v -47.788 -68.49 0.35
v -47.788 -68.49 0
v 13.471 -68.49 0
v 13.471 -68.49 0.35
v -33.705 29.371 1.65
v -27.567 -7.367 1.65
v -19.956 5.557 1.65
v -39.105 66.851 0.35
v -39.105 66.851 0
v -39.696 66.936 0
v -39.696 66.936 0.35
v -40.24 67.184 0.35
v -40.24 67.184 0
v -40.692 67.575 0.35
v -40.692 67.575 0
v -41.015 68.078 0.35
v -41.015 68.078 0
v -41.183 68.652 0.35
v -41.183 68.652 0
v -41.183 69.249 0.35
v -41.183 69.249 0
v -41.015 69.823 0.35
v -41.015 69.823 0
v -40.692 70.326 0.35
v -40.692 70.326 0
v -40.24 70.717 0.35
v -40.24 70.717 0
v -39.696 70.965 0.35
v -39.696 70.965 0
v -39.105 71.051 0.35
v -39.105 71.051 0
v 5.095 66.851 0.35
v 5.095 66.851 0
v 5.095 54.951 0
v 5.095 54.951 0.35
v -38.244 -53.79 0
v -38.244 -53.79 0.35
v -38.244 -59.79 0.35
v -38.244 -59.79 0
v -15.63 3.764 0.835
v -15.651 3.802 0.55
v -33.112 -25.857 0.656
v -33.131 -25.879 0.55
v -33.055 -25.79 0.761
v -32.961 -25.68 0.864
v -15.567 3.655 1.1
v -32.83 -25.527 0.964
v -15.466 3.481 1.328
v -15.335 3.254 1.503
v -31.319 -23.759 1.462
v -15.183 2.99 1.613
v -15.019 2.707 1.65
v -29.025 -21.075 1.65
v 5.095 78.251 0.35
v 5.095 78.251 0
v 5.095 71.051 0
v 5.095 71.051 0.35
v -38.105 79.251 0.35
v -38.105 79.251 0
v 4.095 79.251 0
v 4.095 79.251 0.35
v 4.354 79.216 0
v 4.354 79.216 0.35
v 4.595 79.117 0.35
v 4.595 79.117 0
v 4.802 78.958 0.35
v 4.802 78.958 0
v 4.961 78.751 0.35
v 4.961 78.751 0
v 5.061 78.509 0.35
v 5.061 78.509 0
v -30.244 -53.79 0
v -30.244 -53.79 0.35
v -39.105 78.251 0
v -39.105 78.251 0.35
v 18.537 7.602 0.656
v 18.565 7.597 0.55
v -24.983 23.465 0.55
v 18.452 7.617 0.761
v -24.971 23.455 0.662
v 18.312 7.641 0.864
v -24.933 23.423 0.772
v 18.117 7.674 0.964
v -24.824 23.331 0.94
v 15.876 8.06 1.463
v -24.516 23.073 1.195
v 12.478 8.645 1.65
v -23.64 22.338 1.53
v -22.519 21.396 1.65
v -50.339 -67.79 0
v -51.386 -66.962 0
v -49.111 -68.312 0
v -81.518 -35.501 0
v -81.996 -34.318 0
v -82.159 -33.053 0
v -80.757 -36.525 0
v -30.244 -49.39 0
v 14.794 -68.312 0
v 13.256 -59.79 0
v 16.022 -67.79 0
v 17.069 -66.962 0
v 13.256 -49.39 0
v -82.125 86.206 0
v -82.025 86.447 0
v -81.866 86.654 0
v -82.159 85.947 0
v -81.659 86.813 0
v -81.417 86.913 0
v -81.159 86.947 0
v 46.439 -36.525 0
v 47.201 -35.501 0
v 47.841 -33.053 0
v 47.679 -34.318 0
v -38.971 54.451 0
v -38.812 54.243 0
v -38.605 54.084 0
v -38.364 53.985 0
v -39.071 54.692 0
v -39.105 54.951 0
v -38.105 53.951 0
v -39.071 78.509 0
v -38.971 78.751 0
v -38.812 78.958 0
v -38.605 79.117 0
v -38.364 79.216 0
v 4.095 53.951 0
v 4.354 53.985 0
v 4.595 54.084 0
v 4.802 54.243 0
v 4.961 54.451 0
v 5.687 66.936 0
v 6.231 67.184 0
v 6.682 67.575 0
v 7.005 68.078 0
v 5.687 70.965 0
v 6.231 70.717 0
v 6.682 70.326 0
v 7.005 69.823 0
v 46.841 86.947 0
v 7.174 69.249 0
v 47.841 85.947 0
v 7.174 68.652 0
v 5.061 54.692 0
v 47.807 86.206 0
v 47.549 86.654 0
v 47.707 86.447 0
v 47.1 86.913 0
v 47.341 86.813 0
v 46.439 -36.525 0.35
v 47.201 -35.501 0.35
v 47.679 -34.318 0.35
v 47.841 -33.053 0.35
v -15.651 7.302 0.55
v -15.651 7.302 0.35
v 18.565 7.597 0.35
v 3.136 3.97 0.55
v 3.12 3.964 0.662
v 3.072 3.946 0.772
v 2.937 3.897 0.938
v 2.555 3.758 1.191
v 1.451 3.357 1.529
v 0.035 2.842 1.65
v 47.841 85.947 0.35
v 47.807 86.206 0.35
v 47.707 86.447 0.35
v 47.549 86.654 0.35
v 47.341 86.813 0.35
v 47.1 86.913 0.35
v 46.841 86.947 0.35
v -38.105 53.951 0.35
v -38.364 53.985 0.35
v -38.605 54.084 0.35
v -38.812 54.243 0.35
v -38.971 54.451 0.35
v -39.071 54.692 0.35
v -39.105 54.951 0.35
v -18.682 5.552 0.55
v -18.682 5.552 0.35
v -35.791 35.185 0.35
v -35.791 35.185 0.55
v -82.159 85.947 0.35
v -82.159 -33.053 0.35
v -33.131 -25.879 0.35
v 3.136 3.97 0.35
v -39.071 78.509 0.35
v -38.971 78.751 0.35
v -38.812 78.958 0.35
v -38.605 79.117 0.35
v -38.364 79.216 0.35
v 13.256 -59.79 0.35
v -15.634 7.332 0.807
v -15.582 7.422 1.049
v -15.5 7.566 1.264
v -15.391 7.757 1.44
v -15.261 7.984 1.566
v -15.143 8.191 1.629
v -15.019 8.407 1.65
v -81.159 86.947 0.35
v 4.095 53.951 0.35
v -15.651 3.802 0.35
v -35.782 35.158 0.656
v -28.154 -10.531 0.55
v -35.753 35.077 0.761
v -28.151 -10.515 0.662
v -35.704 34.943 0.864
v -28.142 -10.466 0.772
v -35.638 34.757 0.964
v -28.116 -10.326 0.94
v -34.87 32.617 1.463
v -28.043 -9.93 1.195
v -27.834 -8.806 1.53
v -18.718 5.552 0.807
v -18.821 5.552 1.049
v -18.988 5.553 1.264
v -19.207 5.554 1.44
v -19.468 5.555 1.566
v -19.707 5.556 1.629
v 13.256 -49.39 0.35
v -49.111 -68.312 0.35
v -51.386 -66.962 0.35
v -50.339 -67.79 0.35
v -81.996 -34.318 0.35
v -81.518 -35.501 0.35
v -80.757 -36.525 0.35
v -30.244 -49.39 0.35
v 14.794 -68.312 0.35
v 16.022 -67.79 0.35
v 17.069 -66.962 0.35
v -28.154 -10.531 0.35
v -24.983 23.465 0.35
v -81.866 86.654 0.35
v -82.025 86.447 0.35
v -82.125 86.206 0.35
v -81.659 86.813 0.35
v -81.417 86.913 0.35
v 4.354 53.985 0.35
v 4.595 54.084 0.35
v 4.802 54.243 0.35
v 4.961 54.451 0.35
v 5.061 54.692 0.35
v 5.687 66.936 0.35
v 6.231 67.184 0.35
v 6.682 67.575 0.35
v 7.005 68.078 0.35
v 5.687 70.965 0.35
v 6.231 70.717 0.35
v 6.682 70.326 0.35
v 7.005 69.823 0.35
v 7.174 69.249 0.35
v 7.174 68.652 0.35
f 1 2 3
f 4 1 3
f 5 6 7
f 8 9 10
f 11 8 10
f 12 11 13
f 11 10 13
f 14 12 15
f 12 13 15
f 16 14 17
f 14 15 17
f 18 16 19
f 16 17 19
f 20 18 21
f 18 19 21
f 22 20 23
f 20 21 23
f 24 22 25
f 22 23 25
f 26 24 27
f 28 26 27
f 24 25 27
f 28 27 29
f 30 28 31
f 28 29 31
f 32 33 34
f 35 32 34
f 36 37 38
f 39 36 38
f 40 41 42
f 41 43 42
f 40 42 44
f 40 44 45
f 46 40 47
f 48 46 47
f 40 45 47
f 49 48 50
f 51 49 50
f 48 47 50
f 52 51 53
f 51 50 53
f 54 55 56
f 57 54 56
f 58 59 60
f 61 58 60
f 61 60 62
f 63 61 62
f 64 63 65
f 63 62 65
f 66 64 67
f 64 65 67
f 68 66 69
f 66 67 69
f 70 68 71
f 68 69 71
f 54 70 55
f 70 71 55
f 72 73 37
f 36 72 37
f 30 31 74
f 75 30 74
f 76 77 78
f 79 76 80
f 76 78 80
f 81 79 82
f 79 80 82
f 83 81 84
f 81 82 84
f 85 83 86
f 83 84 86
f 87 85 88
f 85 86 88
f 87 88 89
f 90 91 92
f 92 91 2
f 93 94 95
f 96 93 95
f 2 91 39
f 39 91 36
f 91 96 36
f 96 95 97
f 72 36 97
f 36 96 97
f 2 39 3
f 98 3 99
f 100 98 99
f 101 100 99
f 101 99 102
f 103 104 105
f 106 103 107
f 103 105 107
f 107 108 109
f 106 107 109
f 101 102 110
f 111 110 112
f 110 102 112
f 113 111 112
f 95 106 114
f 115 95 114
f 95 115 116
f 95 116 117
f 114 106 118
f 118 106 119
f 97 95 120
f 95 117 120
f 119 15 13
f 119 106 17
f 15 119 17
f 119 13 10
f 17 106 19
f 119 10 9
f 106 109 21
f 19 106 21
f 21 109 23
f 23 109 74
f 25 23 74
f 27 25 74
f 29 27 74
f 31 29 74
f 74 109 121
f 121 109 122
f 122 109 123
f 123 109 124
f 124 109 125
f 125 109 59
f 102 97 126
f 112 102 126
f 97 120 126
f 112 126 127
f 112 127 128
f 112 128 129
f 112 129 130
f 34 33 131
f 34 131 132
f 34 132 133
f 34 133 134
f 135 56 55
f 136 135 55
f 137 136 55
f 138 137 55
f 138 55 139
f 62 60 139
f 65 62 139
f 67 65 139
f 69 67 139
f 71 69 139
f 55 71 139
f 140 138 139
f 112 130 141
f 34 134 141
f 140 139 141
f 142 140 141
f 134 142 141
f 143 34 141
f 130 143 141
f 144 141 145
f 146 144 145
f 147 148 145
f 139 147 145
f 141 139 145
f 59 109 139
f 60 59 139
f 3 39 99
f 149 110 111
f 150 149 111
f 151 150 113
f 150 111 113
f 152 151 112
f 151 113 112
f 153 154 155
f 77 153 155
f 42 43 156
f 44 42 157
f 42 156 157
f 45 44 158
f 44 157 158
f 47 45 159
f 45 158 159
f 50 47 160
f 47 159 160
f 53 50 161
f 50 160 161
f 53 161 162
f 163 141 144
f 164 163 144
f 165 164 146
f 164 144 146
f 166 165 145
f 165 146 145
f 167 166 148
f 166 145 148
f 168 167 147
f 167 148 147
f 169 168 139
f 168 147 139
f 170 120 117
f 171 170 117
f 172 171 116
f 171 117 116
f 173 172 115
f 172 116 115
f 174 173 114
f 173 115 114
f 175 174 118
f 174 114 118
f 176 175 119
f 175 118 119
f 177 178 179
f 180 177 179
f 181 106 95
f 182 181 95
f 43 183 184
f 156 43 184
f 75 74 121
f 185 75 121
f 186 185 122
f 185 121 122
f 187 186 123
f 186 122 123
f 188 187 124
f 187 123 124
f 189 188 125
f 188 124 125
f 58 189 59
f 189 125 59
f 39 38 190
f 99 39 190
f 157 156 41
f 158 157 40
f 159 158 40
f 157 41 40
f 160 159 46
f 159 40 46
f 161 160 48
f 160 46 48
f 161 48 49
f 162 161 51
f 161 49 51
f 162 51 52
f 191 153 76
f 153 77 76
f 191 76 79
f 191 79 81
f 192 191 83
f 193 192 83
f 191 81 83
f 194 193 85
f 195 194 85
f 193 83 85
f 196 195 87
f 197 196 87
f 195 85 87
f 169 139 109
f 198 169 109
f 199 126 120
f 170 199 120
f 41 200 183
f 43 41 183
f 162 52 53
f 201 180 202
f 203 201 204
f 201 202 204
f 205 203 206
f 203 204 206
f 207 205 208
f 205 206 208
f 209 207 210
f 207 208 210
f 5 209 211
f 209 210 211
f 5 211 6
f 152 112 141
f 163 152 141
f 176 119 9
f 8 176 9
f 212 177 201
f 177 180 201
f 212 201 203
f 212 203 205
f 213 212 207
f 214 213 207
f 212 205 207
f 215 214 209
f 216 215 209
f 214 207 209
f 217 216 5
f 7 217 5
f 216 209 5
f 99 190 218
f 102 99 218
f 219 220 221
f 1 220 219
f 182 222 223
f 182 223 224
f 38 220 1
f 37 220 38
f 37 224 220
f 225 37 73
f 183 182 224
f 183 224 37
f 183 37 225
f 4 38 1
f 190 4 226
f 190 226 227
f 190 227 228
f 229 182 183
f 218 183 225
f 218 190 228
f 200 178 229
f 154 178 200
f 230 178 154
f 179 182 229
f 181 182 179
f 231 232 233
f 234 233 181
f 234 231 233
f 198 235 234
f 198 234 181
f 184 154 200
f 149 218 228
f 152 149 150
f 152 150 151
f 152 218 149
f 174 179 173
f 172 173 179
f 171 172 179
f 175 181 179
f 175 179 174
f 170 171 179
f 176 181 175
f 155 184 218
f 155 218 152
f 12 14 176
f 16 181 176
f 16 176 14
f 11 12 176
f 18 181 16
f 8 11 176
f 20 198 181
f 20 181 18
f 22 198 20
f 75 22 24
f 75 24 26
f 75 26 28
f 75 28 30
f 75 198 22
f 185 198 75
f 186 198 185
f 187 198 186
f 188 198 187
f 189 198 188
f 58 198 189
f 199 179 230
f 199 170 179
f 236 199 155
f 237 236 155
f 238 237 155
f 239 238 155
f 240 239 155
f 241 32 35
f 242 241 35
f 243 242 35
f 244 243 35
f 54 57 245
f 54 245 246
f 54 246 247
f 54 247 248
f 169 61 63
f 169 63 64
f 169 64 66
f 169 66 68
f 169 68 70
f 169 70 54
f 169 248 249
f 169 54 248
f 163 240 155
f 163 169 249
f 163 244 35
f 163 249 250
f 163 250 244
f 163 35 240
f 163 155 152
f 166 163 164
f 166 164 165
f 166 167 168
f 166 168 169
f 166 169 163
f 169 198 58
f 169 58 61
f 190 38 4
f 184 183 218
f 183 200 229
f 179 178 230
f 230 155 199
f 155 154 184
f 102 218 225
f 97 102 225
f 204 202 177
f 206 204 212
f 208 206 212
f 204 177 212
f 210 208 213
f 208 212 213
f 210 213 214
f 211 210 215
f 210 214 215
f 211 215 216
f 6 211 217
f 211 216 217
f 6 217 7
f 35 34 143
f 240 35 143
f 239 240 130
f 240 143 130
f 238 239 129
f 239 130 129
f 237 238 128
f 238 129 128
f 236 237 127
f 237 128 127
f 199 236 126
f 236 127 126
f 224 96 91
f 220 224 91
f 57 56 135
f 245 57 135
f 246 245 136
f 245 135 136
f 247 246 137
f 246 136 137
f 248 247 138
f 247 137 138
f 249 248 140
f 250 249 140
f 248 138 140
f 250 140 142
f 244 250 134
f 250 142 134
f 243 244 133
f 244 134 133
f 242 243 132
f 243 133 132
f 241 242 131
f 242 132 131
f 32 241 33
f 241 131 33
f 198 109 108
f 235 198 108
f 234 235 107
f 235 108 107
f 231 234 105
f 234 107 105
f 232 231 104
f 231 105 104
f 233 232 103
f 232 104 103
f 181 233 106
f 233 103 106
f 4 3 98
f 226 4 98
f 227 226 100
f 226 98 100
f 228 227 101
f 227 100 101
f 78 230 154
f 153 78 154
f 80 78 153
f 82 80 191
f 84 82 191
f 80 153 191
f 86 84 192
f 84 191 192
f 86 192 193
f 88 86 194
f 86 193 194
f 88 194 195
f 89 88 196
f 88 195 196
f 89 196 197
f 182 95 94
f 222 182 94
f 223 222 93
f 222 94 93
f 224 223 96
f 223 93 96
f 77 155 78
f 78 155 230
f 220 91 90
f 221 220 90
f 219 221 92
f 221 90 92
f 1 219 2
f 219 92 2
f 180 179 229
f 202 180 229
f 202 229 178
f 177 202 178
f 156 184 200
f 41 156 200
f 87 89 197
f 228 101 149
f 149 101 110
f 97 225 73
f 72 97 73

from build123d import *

# Parameters (mm, degrees)
F1_DEPTH = 0.35
F3_DEPTH = 2
F5_DEPTH = 1.3
F6_R     = 1.1


with BuildPart() as f1:
    # F0 (on Top) → F1 (new body)
    with BuildSketch(Plane.XY):
        with BuildLine():
            Line((47.8413986466, -33.0526276553), (47.8413986466, 85.9473723447))
            ThreePointArc((47.8413986466, 85.9473723447), (47.5485054278, 86.6544791259), (46.8413986466, 86.9473723447))
            Line((46.8413986466, 86.9473723447), (-81.1586013534, 86.9473723447))
            ThreePointArc((-81.1586013534, 86.9473723447), (-81.8657081346, 86.6544791259), (-82.1586013534, 85.9473723447))
            Line((-82.1586013534, 85.9473723447), (-82.1586013534, -33.0526276553))
            ThreePointArc((-82.1586013534, -33.0526276553), (-81.7948777262, -34.9247765264), (-80.7566247951, -36.5245474862))
            Line((-80.7566247951, -36.5245474862), (-51.3861264072, -66.9618118353))
            ThreePointArc((-51.3861264072, -66.9618118353), (-49.742636266, -68.0920436291), (-47.7881029655, -68.4898920043))
            Line((-47.7881029655, -68.4898920043), (13.4709002587, -68.4898920043))
            ThreePointArc((13.4709002587, -68.4898920043), (15.4254335591, -68.0920436291), (17.0689237004, -66.9618118353))
            Line((17.0689237004, -66.9618118353), (46.4394220883, -36.5245474862))
            ThreePointArc((46.4394220883, -36.5245474862), (47.4776750193, -34.9247765264), (47.8413986466, -33.0526276553))
        make_face()
        with BuildLine():
            ThreePointArc((-39.1047286936, 78.250517656), (-38.8118354748, 78.9576244372), (-38.1047286936, 79.250517656))
            Line((-38.1047286936, 79.250517656), (4.0952713064, 79.250517656))
            ThreePointArc((4.0952713064, 79.250517656), (4.8023780876, 78.9576244372), (5.0952713064, 78.250517656))
            Line((5.0952713064, 78.250517656), (5.0952713064, 71.050517656))
            ThreePointArc((5.0952713064, 71.050517656), (7.1952713064, 68.950517656), (5.0952713064, 66.850517656))
            Line((5.0952713064, 66.850517656), (5.0952713064, 54.950517656))
            ThreePointArc((5.0952713064, 54.950517656), (4.8023780876, 54.2434108748), (4.0952713064, 53.950517656))
            Line((4.0952713064, 53.950517656), (-38.1047286936, 53.950517656))
            ThreePointArc((-38.1047286936, 53.950517656), (-38.8118354748, 54.2434108748), (-39.1047286936, 54.950517656))
            Line((-39.1047286936, 54.950517656), (-39.1047286936, 66.850517656))
            ThreePointArc((-39.1047286936, 66.850517656), (-41.2047286936, 68.950517656), (-39.1047286936, 71.050517656))
            Line((-39.1047286936, 71.050517656), (-39.1047286936, 78.250517656))
        make_face(mode=Mode.SUBTRACT)
    extrude(amount=F1_DEPTH)

    # F2 (on face) → F3 (cut)
    with BuildSketch(Plane.XY.offset(0.35)):
        Polygon((13.2559401929, -49.3898926318), (-30.2440598071, -49.3898926318), (-30.2440598071, -53.7898926318), (-38.2440598071, -53.7898926318), (-38.2440598071, -59.7898926318), (-30.2440598071, -59.7898926318), (13.2559401929, -59.7898926318), align=None)
    extrude(amount=-F3_DEPTH, mode=Mode.SUBTRACT)

    # F4 (on face) → F5 (join)
    with BuildSketch(Plane.XY.offset(0.35)):
        Polygon((-35.7913524045, 35.1850536081), (-28.1538574591, -10.5309743335), (-18.6824351945, 5.5515397377), align=None)
        Polygon((18.5652113225, 7.5971377061), (-24.9834829413, 23.4652745761), (-15.6513462812, 7.3015397377), align=None)
        Polygon((-33.1309387548, -25.878880379), (3.1361268654, 3.9696324182), (-15.6513462812, 3.8015397377), align=None)
    extrude(amount=F5_DEPTH)

    # F6
    f6_edges = [f1.edges().sort_by_distance(p)[0] for p in [
        (-14.997406, -10.954624, 1.65),
        (-6.25761, 3.885586, 1.65),
        (-24.391143, -11.03867, 1.65),
        (-31.972605, 12.32704, 1.65),
        (-23.418146, -2.489717, 1.65),
        (-27.236894, 20.368297, 1.65),
        (1.456933, 7.449339, 1.65),
        (-3.209136, 15.531206, 1.65),
        (-20.317415, 15.383407, 1.65),
    ]]
    fillet(f6_edges, radius=F6_R)


solid = f1.part
